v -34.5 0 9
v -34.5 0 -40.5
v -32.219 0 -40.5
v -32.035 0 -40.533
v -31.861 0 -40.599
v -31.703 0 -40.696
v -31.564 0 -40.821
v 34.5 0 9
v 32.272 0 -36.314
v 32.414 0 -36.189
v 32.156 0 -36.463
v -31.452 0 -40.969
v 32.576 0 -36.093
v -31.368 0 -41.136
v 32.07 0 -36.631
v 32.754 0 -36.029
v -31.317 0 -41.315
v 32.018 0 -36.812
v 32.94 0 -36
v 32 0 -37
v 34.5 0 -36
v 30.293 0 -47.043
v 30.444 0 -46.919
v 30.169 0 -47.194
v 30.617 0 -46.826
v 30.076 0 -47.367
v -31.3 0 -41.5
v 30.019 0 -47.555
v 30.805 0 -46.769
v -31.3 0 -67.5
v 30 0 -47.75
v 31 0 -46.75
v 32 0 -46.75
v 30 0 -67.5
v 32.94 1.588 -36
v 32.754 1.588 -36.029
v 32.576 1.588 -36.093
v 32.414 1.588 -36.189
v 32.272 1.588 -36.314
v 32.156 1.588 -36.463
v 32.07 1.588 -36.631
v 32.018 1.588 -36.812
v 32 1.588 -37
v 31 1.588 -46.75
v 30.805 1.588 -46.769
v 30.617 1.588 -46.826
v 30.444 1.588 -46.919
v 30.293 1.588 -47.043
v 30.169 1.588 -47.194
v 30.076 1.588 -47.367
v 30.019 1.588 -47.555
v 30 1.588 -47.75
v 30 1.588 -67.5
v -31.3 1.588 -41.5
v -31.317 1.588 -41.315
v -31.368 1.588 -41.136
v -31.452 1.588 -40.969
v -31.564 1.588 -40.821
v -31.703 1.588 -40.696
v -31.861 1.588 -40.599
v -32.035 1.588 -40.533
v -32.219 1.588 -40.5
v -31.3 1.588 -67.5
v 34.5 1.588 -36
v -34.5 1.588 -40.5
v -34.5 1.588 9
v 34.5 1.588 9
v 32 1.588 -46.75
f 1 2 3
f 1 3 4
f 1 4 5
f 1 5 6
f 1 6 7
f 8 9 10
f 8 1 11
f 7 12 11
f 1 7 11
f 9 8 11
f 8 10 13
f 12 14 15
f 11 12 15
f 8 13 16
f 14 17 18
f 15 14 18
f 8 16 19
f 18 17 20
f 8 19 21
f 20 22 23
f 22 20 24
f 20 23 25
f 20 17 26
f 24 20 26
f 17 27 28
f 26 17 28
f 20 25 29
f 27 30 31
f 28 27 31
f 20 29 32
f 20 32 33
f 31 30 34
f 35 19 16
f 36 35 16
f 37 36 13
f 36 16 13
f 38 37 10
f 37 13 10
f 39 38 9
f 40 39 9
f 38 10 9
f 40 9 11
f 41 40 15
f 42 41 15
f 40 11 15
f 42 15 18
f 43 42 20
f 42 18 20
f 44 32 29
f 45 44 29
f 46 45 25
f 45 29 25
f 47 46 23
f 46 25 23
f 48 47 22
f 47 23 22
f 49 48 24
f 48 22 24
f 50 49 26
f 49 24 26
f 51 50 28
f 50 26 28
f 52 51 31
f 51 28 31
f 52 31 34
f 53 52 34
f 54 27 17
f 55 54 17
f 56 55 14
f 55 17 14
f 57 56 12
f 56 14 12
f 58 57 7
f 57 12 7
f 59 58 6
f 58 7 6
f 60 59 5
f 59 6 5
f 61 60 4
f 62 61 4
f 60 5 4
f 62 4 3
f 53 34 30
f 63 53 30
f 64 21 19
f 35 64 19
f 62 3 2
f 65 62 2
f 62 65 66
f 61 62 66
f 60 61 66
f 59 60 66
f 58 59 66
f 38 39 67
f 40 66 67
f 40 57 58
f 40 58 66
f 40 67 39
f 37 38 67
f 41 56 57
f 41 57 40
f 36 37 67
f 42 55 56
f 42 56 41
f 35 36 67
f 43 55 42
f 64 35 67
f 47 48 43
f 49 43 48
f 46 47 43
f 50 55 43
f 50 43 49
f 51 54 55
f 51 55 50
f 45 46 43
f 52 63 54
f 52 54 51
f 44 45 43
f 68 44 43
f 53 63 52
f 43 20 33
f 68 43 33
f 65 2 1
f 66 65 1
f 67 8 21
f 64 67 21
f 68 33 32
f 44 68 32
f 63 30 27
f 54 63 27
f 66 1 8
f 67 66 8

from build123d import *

# Parameters (mm, degrees)
FR4_DEPTH = 1.5875


with BuildPart() as part:
    # Sketch1 → FR4 (new body)
    with BuildSketch(Plane(origin=(0, 0, 0), x_dir=(1, 0, 0), z_dir=(0, 1, 0))):
        with BuildLine():
            Line((-34.5, -9), (34.5, -9))
            Line((34.5, -9), (34.5, 36))
            Line((34.5, 36), (32.940007652, 36))
            ThreePointArc((32.940007652, 36), (32.271894631, 36.313775841), (32, 37))
            Line((32, 37), (32, 46.75))
            Line((32, 46.75), (31, 46.75))
            ThreePointArc((31, 46.75), (30.292893219, 47.042893219), (30, 47.75))
            Line((30, 47.75), (30, 67.5))
            Line((30, 67.5), (-31.3, 67.5))
            Line((-31.3, 67.5), (-31.3, 41.5))
            ThreePointArc((-31.3, 41.5), (-31.564481186, 40.821086647), (-32.218527823, 40.5))
            Line((-32.218527823, 40.5), (-34.5, 40.5))
            Line((-34.5, 40.5), (-34.5, -9))
        make_face()
    extrude(amount=FR4_DEPTH)


solid = part.part
